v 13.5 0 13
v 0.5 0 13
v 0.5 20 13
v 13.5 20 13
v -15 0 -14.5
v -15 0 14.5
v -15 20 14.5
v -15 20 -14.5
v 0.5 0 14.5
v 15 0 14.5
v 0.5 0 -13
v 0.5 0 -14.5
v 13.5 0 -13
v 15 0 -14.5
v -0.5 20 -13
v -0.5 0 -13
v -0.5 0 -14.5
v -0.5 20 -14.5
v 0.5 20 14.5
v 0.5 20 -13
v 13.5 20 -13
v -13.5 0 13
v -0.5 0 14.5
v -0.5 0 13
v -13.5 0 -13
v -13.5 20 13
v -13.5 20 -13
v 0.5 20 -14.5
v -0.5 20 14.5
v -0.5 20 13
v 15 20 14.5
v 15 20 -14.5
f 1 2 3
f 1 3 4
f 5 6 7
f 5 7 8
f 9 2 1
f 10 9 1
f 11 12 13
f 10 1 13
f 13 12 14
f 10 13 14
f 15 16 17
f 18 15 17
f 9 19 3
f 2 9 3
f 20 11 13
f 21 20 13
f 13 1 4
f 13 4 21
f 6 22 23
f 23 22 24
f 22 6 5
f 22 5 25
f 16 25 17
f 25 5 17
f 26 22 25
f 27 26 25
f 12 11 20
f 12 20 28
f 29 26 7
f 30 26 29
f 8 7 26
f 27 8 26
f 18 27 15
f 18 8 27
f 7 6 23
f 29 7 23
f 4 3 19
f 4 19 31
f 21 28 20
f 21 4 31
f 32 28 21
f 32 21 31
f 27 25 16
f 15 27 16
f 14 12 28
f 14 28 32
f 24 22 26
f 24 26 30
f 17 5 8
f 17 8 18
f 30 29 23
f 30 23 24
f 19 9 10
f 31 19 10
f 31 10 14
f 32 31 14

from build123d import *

# Parameters (mm, degrees)
SKETCH1_W           = 30
SKETCH1_H           = 29
SKETCH1_W_2         = 27
SKETCH1_H_2         = 26
BOSS_EXTRUDE1_DEPTH = 20
SKETCH2_W           = 1
SKETCH2_H           = 29
CUT_EXTRUDE1_DEPTH  = 21


with BuildPart() as part:
    # Sketch1 → Boss-Extrude1 (new body)
    with BuildSketch(Plane(origin=(0, 0, 0), x_dir=(1, 0, 0), z_dir=(0, 1, 0))):
        Rectangle(SKETCH1_W, SKETCH1_H)
        Rectangle(SKETCH1_W_2, SKETCH1_H_2, mode=Mode.SUBTRACT)
    extrude(amount=BOSS_EXTRUDE1_DEPTH)

    # Sketch2 → Cut-Extrude1 (cut, through all)
    with BuildSketch(Plane(origin=(0, 20, 0), x_dir=(1, 0, 0), z_dir=(0, 1, 0))):
        Rectangle(SKETCH2_W, SKETCH2_H)
    extrude(amount=-CUT_EXTRUDE1_DEPTH, mode=Mode.SUBTRACT)


solid = part.part
